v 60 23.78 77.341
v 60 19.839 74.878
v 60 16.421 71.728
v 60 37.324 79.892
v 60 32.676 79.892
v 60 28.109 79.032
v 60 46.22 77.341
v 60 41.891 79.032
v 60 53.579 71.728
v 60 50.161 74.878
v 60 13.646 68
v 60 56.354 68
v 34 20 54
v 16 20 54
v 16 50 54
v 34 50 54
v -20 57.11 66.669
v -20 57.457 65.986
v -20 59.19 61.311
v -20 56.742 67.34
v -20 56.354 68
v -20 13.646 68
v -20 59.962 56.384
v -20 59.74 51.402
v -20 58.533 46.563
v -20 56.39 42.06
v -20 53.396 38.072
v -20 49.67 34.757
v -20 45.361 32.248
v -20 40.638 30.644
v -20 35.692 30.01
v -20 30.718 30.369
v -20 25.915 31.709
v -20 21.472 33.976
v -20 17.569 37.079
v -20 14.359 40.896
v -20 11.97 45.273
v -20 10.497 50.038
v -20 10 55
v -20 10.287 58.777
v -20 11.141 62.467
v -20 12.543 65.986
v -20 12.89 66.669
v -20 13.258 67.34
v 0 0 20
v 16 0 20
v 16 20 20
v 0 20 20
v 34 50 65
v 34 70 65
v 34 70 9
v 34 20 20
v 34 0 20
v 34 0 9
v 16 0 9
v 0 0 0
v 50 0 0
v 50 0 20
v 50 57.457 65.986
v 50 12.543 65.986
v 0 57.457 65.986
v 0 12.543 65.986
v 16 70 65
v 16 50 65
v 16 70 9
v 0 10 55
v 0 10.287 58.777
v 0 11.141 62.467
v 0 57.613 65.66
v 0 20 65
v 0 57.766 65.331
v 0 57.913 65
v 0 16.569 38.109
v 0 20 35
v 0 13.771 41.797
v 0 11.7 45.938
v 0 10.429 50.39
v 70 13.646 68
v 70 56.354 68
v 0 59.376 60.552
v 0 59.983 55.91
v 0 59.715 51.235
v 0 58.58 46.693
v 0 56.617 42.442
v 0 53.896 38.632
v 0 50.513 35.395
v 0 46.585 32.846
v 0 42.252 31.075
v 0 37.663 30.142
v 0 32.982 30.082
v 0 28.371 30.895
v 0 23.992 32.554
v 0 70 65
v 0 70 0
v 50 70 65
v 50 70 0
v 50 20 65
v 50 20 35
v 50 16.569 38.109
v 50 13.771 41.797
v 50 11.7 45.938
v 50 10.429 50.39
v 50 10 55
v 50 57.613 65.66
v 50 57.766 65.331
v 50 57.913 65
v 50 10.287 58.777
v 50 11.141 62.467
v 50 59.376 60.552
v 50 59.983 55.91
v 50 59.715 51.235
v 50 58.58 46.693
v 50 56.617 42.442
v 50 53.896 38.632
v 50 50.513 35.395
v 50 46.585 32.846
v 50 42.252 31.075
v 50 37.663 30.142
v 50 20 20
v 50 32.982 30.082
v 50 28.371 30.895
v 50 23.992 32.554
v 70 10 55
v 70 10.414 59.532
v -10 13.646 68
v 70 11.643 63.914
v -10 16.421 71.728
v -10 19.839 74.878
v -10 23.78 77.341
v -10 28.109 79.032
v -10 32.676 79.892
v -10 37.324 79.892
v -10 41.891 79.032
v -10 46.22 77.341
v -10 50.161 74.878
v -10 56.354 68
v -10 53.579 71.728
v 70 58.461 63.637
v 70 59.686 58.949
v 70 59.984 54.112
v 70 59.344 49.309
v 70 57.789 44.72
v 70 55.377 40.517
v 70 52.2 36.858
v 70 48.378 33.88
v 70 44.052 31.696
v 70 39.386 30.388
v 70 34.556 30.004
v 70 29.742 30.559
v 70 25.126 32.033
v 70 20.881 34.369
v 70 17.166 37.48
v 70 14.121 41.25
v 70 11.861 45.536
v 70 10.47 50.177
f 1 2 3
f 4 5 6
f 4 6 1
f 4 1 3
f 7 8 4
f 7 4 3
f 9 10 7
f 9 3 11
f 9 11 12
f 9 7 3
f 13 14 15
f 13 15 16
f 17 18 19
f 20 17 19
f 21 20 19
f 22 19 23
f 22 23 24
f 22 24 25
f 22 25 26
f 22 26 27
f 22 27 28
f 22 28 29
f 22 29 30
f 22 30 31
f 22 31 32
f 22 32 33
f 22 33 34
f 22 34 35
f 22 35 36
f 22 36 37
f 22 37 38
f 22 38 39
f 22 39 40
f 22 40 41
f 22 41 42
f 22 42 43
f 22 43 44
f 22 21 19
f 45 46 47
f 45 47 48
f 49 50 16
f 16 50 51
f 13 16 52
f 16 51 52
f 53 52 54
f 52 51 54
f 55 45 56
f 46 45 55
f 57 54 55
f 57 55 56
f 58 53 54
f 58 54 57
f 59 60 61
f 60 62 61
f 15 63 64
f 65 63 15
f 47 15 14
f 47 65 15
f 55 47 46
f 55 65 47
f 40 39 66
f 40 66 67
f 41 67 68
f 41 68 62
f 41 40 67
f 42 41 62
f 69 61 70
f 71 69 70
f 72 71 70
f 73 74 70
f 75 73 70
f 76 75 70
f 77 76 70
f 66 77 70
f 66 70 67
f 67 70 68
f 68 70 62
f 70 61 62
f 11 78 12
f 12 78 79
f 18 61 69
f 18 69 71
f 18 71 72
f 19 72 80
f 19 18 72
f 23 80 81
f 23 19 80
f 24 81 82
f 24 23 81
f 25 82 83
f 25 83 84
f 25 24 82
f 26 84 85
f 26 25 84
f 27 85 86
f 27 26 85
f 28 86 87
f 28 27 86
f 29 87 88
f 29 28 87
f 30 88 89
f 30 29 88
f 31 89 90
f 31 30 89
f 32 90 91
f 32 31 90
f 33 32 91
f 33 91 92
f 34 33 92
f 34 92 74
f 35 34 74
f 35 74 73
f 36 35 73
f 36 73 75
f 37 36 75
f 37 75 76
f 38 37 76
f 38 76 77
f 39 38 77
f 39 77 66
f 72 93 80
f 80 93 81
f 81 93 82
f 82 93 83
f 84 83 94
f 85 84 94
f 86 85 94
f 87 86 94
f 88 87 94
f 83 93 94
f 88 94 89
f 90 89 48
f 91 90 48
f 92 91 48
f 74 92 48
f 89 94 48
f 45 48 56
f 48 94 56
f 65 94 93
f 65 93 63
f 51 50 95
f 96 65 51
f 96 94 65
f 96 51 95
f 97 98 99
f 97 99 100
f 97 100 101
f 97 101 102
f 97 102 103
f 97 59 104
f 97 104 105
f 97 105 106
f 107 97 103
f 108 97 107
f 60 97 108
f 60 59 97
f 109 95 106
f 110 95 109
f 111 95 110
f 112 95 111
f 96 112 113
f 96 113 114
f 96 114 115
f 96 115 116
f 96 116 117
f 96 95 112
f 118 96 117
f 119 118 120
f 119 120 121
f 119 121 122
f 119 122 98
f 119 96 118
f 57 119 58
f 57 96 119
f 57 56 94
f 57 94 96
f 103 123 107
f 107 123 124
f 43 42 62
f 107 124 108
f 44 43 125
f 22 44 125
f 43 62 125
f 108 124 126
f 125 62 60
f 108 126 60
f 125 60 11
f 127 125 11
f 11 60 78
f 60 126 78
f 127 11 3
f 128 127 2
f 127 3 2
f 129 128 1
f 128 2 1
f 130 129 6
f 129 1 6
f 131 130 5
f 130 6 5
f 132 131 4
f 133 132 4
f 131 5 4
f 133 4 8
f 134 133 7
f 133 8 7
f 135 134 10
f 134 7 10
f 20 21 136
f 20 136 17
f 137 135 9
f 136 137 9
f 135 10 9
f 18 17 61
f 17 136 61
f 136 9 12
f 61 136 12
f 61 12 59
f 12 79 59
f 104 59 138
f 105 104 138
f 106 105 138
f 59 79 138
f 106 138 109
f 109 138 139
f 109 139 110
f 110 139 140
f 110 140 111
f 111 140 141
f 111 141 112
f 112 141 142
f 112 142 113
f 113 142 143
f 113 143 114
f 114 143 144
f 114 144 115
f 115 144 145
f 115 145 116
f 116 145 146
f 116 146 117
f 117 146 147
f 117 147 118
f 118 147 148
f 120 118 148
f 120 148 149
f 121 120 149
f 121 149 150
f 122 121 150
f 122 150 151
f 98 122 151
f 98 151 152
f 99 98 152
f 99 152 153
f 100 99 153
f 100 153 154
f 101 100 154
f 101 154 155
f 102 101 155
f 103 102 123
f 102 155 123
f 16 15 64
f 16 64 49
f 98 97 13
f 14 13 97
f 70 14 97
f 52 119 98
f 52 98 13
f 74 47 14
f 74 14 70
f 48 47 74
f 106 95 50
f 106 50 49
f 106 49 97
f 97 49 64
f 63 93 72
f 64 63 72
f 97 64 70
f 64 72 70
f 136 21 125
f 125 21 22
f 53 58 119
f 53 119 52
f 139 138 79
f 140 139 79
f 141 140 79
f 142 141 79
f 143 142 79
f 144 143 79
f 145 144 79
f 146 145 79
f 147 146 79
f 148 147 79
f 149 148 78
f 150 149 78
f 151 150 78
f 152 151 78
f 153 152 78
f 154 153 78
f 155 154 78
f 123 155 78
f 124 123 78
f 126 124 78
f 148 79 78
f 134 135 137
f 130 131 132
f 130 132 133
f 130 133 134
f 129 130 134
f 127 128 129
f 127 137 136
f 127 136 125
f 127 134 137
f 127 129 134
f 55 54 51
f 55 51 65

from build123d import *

# Parameters (mm, degrees)
F1_DEPTH  = 70
F2_W      = 16
F2_H      = 50
F3_DEPTH  = 45
F5_DEPTH  = 20
F6_DEPTH  = 90
F10_DEPTH = 10
F12_DEPTH = 10
F13_DEPTH = 20
F16_DEPTH = 50
F17_DEPTH = 25
F18_DEPTH = 5
F19_W     = 18
F19_H     = 19
F20_DEPTH = 50.001
F21_DEPTH = 5
F22_DEPTH = 20


with BuildPart() as f1:
    # F0 (on Front) → F1 (new body)
    with BuildSketch(Plane.XZ):
        Polygon((0, 20), (0, 0), (50, 0), (50, 20), (34, 20), (34, 9), (16, 9), (16, 20), align=None)
    extrude(amount=-F1_DEPTH)

    # F2 (on face) → F3 (join)
    with BuildSketch(Plane.XY.offset(20)):
        with Locations((8, 45)):
            Rectangle(F2_W, F2_H)
        with Locations((42, 45)):
            Rectangle(F2_W, F2_H)
    extrude(amount=F3_DEPTH)

    # F4 (on face) → F5 (join)
    with BuildSketch(Plane(origin=(0, 0, 0), x_dir=(0, -1, 0), z_dir=(-1, 0, 0))):
        with BuildLine():
            ThreePointArc((-20, 35), (-12.639320225, 43.8196601125), (-10, 55))
            ThreePointArc((-10, 55), (-29.8922589078, 79.4726578233), (-57.9128784748, 65))
            Line((-57.9128784748, 65), (-20, 65))
            Line((-20, 65), (-20, 35))
        make_face()
        with BuildLine():
            Line((-20, 65), (-57.9128784748, 65))
            ThreePointArc((-57.9128784748, 65), (-50.5130078141, 35.3952406656), (-20, 35))
            Line((-20, 35), (-20, 65))
        make_face()
    extrude(amount=F5_DEPTH)

    # F6 (add): a face of the model
    f6_faces = [f1.faces().sort_by_distance(p)[0] for p in [
        (-20, 35, 55),
    ]]
    extrude(f6_faces, amount=-F6_DEPTH)

    # F9 (on face) → F10 (cut)
    with BuildSketch(Plane(origin=(-20, 0, 0), x_dir=(0, -1, 0), z_dir=(-1, 0, 0))):
        with BuildLine():
            ThreePointArc((-13.6460271844, 68.0003017268), (-35, 80), (-56.3539728156, 68.0003017268))
            Line((-56.3539728156, 68.0003017268), (-13.6460271844, 68.0003017268))
        make_face()
    extrude(amount=-F10_DEPTH, mode=Mode.SUBTRACT)

    # F11 (on face) → F12 (cut)
    with BuildSketch(Plane.YZ.offset(70)):
        with BuildLine():
            ThreePointArc((56.3539728156, 68.0003017268), (35, 80), (13.6460271844, 68.0003017268))
            Line((13.6460271844, 68.0003017268), (56.3539728156, 68.0003017268))
        make_face()
    extrude(amount=-F12_DEPTH, mode=Mode.SUBTRACT)

    # F8 (on face) → F13 (cut)
    with BuildSketch(Plane(origin=(-20, 0, 0), x_dir=(0, -1, 0), z_dir=(-1, 0, 0))):
        with BuildLine():
            Line((-12.5433961203, 65.9863980535), (-35.1228261001, 65.9863980535))
            Line((-35.1228261001, 65.9863980535), (-35.1228261001, 30.0003017268))
            ThreePointArc((-35.1228261001, 30.0003017268), (-17.3658095239, 37.2789580935), (-10, 55))
            ThreePointArc((-10, 55), (-10.6441475514, 60.6384795383), (-12.5433961203, 65.9863980535))
        make_face()
        with BuildLine():
            Line((-35.1228261001, 30.0003017268), (-35.1228261001, 65.9863980535))
            Line((-35.1228261001, 65.9863980535), (-57.4566038797, 65.9863980535))
            ThreePointArc((-57.4566038797, 65.9863980535), (-56.2416441633, 41.816959636), (-35.1228261001, 30.0003017268))
        make_face()
    extrude(amount=-F13_DEPTH, mode=Mode.SUBTRACT)

    # F15 (on face) + F14 (on face) → F16 (cut)
    with BuildSketch(Plane(origin=(0, 0, 0), x_dir=(0, -1, 0), z_dir=(-1, 0, 0))):
        with BuildLine():
            Line((-70, 65), (-70, 35))
            Line((-70, 35), (-20, 35))
            Line((-20, 35), (-20, 65.9863980535))
            Line((-20, 65.9863980535), (-57.4566038797, 65.9863980535))
            ThreePointArc((-57.4566038797, 65.9863980535), (-57.6901019733, 65.4956787508), (-57.9128784748, 65))
            Line((-57.9128784748, 65), (-70, 65))
        make_face()
    with BuildSketch(Plane(origin=(0, 0, 0), x_dir=(0, -1, 0), z_dir=(-1, 0, 0))):
        with BuildLine():
            Line((-20, 65.9863980535), (-20, 35))
            ThreePointArc((-20, 35), (-12.639320225, 43.8196601125), (-10, 55))
            ThreePointArc((-10, 55), (-10.6441475514, 60.6384795383), (-12.5433961203, 65.9863980535))
            Line((-12.5433961203, 65.9863980535), (-20, 65.9863980535))
        make_face()
    extrude(amount=-F16_DEPTH, mode=Mode.SUBTRACT)

    # F17 (add): a face of the model
    f17_faces = [f1.faces().sort_by_distance(p)[0] for p in [
        (25, 42.476635514, 35),
    ]]
    extrude(f17_faces, amount=F17_DEPTH)

    # F18 (add): a face of the model
    f18_faces = [f1.faces().sort_by_distance(p)[0] for p in [
        (25, 42.476635514, 60),
    ]]
    extrude(f18_faces, amount=F18_DEPTH)

    # F19 (on face) → F20 (cut, through all)
    with BuildSketch(Plane.XZ.offset(-20)):
        with Locations((25, 44.5)):
            Rectangle(F19_W, F19_H)
    extrude(amount=-F20_DEPTH, mode=Mode.SUBTRACT)

    # F21 (cut, through all): a face of the model
    f21_faces = [f1.faces().sort_by_distance(p)[0] for p in [
        (25, 35, 35),
    ]]
    extrude(f21_faces, amount=-F21_DEPTH, mode=Mode.SUBTRACT)

    # F7 (on face) → F22 (join)
    with BuildSketch(Plane(origin=(-20, 0, 0), x_dir=(0, -1, 0), z_dir=(-1, 0, 0))):
        with BuildLine():
            Line((-12.5433961203, 65.9863980535), (-57.4566038797, 65.9863980535))
            ThreePointArc((-57.4566038797, 65.9863980535), (-40.6384795383, 30.6441475514), (-10, 55))
            ThreePointArc((-10, 55), (-10.6441475514, 60.6384795383), (-12.5433961203, 65.9863980535))
        make_face()
    extrude(amount=-F22_DEPTH)


solid = f1.part
